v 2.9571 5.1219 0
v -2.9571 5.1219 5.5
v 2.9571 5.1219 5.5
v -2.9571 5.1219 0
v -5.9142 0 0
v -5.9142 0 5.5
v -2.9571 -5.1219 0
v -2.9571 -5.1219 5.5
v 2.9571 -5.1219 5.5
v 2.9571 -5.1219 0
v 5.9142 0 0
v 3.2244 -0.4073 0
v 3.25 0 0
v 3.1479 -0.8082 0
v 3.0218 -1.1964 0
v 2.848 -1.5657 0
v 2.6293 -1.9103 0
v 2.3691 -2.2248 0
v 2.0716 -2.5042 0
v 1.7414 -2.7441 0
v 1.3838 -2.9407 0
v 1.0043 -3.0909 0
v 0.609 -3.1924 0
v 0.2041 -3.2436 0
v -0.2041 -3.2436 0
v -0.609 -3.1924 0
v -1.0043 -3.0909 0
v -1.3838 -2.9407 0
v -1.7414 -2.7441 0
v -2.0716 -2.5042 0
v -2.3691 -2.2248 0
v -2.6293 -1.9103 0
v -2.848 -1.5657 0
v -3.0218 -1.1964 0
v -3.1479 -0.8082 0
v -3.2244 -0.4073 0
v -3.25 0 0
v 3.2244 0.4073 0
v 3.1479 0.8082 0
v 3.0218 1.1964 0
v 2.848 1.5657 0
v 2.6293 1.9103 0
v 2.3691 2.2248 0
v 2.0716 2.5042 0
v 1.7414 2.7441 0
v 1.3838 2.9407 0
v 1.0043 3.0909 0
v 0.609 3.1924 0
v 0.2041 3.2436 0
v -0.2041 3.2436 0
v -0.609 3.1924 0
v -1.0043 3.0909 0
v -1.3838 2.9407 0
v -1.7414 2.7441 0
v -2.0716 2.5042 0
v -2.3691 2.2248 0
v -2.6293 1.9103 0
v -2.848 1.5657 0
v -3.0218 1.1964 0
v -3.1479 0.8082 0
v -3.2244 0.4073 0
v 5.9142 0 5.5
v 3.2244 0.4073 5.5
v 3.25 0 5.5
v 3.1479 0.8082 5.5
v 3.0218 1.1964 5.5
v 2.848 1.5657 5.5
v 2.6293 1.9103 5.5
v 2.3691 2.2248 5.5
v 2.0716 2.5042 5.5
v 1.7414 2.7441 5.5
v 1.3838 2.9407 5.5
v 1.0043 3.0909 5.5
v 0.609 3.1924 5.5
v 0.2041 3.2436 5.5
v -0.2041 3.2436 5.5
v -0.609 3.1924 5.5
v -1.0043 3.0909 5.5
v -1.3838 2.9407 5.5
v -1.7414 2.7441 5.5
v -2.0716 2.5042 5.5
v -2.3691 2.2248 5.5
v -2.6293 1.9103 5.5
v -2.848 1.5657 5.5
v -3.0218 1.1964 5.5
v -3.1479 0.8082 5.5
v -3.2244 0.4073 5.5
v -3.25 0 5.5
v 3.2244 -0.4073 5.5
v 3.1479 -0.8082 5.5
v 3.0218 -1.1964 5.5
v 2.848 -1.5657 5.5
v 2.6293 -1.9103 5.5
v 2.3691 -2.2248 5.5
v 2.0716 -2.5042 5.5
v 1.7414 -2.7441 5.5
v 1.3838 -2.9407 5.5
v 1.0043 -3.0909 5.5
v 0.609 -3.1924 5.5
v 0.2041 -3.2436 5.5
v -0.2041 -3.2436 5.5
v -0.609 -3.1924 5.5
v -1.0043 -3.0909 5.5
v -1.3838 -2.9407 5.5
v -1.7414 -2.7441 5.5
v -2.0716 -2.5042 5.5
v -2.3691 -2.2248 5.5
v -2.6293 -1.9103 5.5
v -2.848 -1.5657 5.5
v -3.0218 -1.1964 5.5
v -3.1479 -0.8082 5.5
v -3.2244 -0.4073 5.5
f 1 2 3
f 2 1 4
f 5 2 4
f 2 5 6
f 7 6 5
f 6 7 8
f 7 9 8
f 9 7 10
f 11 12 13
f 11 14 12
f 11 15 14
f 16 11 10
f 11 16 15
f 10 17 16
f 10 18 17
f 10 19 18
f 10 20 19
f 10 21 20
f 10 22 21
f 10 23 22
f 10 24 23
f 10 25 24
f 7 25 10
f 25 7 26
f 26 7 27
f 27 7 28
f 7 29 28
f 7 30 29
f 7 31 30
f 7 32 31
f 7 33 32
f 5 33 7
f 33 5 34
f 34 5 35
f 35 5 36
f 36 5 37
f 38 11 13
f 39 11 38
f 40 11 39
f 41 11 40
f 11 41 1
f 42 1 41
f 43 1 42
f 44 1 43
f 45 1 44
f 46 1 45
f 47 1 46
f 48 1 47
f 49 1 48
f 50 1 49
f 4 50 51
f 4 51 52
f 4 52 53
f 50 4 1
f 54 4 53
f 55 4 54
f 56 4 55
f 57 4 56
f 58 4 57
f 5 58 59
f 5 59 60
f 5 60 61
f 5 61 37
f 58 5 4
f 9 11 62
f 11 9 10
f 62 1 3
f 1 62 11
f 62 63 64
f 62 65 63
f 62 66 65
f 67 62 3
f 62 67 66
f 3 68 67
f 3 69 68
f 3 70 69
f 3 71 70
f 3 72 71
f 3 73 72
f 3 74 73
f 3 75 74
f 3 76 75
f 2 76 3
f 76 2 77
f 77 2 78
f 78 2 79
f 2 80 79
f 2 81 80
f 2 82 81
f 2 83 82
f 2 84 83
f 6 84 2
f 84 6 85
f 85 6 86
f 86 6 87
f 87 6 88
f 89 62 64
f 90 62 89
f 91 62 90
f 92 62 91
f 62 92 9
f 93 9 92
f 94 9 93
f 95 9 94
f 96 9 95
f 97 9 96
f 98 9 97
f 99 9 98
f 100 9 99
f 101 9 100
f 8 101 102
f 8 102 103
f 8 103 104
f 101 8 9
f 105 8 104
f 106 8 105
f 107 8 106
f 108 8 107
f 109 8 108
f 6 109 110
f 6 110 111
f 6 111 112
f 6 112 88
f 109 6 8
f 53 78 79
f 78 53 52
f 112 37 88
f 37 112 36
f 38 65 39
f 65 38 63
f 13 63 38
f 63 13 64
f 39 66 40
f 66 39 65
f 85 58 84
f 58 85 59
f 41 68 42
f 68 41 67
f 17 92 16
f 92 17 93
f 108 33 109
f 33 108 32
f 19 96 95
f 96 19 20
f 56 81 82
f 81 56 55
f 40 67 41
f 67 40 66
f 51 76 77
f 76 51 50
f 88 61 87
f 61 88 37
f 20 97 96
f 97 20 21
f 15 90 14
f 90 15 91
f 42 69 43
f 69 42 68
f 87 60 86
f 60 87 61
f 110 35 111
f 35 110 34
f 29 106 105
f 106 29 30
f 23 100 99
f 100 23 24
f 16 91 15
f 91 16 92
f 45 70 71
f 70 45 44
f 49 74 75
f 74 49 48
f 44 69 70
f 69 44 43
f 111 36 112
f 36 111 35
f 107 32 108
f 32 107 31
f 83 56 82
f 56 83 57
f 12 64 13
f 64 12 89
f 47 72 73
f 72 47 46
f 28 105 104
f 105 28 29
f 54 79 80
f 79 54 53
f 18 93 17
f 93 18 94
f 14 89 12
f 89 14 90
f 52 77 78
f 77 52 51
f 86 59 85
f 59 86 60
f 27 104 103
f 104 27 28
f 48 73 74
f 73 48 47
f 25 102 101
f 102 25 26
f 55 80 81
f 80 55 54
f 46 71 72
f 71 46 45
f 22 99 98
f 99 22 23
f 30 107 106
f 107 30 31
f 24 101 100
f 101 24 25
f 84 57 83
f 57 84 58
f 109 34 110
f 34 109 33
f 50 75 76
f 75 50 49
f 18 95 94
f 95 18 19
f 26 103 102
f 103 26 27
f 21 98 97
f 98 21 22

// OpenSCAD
$fn = 50;


difference() {
	union() {
		translate(v = [0, 0, 0]) {
			rotate(a = [0, 0, 0]) {
				translate(v = [0, 0, 0]) {
					rotate(a = [0, 0, 0]) {
						linear_extrude(height = 5.5000000000) {
							polygon(points = [[5.9142500000, 0.0000000000], [2.9571250000, 5.1218907443], [-2.9571250000, 5.1218907443], [-5.9142500000, 0.0000000000], [-2.9571250000, -5.1218907443], [2.9571250000, -5.1218907443]]);
						}
					}
				}
			}
		}
	}
	union() {
		translate(v = [0, 0, -10]) {
			rotate(a = [0, 0, 0]) {
				cylinder(h = 20, r = 3.2500000000);
			}
		}
	}
}
